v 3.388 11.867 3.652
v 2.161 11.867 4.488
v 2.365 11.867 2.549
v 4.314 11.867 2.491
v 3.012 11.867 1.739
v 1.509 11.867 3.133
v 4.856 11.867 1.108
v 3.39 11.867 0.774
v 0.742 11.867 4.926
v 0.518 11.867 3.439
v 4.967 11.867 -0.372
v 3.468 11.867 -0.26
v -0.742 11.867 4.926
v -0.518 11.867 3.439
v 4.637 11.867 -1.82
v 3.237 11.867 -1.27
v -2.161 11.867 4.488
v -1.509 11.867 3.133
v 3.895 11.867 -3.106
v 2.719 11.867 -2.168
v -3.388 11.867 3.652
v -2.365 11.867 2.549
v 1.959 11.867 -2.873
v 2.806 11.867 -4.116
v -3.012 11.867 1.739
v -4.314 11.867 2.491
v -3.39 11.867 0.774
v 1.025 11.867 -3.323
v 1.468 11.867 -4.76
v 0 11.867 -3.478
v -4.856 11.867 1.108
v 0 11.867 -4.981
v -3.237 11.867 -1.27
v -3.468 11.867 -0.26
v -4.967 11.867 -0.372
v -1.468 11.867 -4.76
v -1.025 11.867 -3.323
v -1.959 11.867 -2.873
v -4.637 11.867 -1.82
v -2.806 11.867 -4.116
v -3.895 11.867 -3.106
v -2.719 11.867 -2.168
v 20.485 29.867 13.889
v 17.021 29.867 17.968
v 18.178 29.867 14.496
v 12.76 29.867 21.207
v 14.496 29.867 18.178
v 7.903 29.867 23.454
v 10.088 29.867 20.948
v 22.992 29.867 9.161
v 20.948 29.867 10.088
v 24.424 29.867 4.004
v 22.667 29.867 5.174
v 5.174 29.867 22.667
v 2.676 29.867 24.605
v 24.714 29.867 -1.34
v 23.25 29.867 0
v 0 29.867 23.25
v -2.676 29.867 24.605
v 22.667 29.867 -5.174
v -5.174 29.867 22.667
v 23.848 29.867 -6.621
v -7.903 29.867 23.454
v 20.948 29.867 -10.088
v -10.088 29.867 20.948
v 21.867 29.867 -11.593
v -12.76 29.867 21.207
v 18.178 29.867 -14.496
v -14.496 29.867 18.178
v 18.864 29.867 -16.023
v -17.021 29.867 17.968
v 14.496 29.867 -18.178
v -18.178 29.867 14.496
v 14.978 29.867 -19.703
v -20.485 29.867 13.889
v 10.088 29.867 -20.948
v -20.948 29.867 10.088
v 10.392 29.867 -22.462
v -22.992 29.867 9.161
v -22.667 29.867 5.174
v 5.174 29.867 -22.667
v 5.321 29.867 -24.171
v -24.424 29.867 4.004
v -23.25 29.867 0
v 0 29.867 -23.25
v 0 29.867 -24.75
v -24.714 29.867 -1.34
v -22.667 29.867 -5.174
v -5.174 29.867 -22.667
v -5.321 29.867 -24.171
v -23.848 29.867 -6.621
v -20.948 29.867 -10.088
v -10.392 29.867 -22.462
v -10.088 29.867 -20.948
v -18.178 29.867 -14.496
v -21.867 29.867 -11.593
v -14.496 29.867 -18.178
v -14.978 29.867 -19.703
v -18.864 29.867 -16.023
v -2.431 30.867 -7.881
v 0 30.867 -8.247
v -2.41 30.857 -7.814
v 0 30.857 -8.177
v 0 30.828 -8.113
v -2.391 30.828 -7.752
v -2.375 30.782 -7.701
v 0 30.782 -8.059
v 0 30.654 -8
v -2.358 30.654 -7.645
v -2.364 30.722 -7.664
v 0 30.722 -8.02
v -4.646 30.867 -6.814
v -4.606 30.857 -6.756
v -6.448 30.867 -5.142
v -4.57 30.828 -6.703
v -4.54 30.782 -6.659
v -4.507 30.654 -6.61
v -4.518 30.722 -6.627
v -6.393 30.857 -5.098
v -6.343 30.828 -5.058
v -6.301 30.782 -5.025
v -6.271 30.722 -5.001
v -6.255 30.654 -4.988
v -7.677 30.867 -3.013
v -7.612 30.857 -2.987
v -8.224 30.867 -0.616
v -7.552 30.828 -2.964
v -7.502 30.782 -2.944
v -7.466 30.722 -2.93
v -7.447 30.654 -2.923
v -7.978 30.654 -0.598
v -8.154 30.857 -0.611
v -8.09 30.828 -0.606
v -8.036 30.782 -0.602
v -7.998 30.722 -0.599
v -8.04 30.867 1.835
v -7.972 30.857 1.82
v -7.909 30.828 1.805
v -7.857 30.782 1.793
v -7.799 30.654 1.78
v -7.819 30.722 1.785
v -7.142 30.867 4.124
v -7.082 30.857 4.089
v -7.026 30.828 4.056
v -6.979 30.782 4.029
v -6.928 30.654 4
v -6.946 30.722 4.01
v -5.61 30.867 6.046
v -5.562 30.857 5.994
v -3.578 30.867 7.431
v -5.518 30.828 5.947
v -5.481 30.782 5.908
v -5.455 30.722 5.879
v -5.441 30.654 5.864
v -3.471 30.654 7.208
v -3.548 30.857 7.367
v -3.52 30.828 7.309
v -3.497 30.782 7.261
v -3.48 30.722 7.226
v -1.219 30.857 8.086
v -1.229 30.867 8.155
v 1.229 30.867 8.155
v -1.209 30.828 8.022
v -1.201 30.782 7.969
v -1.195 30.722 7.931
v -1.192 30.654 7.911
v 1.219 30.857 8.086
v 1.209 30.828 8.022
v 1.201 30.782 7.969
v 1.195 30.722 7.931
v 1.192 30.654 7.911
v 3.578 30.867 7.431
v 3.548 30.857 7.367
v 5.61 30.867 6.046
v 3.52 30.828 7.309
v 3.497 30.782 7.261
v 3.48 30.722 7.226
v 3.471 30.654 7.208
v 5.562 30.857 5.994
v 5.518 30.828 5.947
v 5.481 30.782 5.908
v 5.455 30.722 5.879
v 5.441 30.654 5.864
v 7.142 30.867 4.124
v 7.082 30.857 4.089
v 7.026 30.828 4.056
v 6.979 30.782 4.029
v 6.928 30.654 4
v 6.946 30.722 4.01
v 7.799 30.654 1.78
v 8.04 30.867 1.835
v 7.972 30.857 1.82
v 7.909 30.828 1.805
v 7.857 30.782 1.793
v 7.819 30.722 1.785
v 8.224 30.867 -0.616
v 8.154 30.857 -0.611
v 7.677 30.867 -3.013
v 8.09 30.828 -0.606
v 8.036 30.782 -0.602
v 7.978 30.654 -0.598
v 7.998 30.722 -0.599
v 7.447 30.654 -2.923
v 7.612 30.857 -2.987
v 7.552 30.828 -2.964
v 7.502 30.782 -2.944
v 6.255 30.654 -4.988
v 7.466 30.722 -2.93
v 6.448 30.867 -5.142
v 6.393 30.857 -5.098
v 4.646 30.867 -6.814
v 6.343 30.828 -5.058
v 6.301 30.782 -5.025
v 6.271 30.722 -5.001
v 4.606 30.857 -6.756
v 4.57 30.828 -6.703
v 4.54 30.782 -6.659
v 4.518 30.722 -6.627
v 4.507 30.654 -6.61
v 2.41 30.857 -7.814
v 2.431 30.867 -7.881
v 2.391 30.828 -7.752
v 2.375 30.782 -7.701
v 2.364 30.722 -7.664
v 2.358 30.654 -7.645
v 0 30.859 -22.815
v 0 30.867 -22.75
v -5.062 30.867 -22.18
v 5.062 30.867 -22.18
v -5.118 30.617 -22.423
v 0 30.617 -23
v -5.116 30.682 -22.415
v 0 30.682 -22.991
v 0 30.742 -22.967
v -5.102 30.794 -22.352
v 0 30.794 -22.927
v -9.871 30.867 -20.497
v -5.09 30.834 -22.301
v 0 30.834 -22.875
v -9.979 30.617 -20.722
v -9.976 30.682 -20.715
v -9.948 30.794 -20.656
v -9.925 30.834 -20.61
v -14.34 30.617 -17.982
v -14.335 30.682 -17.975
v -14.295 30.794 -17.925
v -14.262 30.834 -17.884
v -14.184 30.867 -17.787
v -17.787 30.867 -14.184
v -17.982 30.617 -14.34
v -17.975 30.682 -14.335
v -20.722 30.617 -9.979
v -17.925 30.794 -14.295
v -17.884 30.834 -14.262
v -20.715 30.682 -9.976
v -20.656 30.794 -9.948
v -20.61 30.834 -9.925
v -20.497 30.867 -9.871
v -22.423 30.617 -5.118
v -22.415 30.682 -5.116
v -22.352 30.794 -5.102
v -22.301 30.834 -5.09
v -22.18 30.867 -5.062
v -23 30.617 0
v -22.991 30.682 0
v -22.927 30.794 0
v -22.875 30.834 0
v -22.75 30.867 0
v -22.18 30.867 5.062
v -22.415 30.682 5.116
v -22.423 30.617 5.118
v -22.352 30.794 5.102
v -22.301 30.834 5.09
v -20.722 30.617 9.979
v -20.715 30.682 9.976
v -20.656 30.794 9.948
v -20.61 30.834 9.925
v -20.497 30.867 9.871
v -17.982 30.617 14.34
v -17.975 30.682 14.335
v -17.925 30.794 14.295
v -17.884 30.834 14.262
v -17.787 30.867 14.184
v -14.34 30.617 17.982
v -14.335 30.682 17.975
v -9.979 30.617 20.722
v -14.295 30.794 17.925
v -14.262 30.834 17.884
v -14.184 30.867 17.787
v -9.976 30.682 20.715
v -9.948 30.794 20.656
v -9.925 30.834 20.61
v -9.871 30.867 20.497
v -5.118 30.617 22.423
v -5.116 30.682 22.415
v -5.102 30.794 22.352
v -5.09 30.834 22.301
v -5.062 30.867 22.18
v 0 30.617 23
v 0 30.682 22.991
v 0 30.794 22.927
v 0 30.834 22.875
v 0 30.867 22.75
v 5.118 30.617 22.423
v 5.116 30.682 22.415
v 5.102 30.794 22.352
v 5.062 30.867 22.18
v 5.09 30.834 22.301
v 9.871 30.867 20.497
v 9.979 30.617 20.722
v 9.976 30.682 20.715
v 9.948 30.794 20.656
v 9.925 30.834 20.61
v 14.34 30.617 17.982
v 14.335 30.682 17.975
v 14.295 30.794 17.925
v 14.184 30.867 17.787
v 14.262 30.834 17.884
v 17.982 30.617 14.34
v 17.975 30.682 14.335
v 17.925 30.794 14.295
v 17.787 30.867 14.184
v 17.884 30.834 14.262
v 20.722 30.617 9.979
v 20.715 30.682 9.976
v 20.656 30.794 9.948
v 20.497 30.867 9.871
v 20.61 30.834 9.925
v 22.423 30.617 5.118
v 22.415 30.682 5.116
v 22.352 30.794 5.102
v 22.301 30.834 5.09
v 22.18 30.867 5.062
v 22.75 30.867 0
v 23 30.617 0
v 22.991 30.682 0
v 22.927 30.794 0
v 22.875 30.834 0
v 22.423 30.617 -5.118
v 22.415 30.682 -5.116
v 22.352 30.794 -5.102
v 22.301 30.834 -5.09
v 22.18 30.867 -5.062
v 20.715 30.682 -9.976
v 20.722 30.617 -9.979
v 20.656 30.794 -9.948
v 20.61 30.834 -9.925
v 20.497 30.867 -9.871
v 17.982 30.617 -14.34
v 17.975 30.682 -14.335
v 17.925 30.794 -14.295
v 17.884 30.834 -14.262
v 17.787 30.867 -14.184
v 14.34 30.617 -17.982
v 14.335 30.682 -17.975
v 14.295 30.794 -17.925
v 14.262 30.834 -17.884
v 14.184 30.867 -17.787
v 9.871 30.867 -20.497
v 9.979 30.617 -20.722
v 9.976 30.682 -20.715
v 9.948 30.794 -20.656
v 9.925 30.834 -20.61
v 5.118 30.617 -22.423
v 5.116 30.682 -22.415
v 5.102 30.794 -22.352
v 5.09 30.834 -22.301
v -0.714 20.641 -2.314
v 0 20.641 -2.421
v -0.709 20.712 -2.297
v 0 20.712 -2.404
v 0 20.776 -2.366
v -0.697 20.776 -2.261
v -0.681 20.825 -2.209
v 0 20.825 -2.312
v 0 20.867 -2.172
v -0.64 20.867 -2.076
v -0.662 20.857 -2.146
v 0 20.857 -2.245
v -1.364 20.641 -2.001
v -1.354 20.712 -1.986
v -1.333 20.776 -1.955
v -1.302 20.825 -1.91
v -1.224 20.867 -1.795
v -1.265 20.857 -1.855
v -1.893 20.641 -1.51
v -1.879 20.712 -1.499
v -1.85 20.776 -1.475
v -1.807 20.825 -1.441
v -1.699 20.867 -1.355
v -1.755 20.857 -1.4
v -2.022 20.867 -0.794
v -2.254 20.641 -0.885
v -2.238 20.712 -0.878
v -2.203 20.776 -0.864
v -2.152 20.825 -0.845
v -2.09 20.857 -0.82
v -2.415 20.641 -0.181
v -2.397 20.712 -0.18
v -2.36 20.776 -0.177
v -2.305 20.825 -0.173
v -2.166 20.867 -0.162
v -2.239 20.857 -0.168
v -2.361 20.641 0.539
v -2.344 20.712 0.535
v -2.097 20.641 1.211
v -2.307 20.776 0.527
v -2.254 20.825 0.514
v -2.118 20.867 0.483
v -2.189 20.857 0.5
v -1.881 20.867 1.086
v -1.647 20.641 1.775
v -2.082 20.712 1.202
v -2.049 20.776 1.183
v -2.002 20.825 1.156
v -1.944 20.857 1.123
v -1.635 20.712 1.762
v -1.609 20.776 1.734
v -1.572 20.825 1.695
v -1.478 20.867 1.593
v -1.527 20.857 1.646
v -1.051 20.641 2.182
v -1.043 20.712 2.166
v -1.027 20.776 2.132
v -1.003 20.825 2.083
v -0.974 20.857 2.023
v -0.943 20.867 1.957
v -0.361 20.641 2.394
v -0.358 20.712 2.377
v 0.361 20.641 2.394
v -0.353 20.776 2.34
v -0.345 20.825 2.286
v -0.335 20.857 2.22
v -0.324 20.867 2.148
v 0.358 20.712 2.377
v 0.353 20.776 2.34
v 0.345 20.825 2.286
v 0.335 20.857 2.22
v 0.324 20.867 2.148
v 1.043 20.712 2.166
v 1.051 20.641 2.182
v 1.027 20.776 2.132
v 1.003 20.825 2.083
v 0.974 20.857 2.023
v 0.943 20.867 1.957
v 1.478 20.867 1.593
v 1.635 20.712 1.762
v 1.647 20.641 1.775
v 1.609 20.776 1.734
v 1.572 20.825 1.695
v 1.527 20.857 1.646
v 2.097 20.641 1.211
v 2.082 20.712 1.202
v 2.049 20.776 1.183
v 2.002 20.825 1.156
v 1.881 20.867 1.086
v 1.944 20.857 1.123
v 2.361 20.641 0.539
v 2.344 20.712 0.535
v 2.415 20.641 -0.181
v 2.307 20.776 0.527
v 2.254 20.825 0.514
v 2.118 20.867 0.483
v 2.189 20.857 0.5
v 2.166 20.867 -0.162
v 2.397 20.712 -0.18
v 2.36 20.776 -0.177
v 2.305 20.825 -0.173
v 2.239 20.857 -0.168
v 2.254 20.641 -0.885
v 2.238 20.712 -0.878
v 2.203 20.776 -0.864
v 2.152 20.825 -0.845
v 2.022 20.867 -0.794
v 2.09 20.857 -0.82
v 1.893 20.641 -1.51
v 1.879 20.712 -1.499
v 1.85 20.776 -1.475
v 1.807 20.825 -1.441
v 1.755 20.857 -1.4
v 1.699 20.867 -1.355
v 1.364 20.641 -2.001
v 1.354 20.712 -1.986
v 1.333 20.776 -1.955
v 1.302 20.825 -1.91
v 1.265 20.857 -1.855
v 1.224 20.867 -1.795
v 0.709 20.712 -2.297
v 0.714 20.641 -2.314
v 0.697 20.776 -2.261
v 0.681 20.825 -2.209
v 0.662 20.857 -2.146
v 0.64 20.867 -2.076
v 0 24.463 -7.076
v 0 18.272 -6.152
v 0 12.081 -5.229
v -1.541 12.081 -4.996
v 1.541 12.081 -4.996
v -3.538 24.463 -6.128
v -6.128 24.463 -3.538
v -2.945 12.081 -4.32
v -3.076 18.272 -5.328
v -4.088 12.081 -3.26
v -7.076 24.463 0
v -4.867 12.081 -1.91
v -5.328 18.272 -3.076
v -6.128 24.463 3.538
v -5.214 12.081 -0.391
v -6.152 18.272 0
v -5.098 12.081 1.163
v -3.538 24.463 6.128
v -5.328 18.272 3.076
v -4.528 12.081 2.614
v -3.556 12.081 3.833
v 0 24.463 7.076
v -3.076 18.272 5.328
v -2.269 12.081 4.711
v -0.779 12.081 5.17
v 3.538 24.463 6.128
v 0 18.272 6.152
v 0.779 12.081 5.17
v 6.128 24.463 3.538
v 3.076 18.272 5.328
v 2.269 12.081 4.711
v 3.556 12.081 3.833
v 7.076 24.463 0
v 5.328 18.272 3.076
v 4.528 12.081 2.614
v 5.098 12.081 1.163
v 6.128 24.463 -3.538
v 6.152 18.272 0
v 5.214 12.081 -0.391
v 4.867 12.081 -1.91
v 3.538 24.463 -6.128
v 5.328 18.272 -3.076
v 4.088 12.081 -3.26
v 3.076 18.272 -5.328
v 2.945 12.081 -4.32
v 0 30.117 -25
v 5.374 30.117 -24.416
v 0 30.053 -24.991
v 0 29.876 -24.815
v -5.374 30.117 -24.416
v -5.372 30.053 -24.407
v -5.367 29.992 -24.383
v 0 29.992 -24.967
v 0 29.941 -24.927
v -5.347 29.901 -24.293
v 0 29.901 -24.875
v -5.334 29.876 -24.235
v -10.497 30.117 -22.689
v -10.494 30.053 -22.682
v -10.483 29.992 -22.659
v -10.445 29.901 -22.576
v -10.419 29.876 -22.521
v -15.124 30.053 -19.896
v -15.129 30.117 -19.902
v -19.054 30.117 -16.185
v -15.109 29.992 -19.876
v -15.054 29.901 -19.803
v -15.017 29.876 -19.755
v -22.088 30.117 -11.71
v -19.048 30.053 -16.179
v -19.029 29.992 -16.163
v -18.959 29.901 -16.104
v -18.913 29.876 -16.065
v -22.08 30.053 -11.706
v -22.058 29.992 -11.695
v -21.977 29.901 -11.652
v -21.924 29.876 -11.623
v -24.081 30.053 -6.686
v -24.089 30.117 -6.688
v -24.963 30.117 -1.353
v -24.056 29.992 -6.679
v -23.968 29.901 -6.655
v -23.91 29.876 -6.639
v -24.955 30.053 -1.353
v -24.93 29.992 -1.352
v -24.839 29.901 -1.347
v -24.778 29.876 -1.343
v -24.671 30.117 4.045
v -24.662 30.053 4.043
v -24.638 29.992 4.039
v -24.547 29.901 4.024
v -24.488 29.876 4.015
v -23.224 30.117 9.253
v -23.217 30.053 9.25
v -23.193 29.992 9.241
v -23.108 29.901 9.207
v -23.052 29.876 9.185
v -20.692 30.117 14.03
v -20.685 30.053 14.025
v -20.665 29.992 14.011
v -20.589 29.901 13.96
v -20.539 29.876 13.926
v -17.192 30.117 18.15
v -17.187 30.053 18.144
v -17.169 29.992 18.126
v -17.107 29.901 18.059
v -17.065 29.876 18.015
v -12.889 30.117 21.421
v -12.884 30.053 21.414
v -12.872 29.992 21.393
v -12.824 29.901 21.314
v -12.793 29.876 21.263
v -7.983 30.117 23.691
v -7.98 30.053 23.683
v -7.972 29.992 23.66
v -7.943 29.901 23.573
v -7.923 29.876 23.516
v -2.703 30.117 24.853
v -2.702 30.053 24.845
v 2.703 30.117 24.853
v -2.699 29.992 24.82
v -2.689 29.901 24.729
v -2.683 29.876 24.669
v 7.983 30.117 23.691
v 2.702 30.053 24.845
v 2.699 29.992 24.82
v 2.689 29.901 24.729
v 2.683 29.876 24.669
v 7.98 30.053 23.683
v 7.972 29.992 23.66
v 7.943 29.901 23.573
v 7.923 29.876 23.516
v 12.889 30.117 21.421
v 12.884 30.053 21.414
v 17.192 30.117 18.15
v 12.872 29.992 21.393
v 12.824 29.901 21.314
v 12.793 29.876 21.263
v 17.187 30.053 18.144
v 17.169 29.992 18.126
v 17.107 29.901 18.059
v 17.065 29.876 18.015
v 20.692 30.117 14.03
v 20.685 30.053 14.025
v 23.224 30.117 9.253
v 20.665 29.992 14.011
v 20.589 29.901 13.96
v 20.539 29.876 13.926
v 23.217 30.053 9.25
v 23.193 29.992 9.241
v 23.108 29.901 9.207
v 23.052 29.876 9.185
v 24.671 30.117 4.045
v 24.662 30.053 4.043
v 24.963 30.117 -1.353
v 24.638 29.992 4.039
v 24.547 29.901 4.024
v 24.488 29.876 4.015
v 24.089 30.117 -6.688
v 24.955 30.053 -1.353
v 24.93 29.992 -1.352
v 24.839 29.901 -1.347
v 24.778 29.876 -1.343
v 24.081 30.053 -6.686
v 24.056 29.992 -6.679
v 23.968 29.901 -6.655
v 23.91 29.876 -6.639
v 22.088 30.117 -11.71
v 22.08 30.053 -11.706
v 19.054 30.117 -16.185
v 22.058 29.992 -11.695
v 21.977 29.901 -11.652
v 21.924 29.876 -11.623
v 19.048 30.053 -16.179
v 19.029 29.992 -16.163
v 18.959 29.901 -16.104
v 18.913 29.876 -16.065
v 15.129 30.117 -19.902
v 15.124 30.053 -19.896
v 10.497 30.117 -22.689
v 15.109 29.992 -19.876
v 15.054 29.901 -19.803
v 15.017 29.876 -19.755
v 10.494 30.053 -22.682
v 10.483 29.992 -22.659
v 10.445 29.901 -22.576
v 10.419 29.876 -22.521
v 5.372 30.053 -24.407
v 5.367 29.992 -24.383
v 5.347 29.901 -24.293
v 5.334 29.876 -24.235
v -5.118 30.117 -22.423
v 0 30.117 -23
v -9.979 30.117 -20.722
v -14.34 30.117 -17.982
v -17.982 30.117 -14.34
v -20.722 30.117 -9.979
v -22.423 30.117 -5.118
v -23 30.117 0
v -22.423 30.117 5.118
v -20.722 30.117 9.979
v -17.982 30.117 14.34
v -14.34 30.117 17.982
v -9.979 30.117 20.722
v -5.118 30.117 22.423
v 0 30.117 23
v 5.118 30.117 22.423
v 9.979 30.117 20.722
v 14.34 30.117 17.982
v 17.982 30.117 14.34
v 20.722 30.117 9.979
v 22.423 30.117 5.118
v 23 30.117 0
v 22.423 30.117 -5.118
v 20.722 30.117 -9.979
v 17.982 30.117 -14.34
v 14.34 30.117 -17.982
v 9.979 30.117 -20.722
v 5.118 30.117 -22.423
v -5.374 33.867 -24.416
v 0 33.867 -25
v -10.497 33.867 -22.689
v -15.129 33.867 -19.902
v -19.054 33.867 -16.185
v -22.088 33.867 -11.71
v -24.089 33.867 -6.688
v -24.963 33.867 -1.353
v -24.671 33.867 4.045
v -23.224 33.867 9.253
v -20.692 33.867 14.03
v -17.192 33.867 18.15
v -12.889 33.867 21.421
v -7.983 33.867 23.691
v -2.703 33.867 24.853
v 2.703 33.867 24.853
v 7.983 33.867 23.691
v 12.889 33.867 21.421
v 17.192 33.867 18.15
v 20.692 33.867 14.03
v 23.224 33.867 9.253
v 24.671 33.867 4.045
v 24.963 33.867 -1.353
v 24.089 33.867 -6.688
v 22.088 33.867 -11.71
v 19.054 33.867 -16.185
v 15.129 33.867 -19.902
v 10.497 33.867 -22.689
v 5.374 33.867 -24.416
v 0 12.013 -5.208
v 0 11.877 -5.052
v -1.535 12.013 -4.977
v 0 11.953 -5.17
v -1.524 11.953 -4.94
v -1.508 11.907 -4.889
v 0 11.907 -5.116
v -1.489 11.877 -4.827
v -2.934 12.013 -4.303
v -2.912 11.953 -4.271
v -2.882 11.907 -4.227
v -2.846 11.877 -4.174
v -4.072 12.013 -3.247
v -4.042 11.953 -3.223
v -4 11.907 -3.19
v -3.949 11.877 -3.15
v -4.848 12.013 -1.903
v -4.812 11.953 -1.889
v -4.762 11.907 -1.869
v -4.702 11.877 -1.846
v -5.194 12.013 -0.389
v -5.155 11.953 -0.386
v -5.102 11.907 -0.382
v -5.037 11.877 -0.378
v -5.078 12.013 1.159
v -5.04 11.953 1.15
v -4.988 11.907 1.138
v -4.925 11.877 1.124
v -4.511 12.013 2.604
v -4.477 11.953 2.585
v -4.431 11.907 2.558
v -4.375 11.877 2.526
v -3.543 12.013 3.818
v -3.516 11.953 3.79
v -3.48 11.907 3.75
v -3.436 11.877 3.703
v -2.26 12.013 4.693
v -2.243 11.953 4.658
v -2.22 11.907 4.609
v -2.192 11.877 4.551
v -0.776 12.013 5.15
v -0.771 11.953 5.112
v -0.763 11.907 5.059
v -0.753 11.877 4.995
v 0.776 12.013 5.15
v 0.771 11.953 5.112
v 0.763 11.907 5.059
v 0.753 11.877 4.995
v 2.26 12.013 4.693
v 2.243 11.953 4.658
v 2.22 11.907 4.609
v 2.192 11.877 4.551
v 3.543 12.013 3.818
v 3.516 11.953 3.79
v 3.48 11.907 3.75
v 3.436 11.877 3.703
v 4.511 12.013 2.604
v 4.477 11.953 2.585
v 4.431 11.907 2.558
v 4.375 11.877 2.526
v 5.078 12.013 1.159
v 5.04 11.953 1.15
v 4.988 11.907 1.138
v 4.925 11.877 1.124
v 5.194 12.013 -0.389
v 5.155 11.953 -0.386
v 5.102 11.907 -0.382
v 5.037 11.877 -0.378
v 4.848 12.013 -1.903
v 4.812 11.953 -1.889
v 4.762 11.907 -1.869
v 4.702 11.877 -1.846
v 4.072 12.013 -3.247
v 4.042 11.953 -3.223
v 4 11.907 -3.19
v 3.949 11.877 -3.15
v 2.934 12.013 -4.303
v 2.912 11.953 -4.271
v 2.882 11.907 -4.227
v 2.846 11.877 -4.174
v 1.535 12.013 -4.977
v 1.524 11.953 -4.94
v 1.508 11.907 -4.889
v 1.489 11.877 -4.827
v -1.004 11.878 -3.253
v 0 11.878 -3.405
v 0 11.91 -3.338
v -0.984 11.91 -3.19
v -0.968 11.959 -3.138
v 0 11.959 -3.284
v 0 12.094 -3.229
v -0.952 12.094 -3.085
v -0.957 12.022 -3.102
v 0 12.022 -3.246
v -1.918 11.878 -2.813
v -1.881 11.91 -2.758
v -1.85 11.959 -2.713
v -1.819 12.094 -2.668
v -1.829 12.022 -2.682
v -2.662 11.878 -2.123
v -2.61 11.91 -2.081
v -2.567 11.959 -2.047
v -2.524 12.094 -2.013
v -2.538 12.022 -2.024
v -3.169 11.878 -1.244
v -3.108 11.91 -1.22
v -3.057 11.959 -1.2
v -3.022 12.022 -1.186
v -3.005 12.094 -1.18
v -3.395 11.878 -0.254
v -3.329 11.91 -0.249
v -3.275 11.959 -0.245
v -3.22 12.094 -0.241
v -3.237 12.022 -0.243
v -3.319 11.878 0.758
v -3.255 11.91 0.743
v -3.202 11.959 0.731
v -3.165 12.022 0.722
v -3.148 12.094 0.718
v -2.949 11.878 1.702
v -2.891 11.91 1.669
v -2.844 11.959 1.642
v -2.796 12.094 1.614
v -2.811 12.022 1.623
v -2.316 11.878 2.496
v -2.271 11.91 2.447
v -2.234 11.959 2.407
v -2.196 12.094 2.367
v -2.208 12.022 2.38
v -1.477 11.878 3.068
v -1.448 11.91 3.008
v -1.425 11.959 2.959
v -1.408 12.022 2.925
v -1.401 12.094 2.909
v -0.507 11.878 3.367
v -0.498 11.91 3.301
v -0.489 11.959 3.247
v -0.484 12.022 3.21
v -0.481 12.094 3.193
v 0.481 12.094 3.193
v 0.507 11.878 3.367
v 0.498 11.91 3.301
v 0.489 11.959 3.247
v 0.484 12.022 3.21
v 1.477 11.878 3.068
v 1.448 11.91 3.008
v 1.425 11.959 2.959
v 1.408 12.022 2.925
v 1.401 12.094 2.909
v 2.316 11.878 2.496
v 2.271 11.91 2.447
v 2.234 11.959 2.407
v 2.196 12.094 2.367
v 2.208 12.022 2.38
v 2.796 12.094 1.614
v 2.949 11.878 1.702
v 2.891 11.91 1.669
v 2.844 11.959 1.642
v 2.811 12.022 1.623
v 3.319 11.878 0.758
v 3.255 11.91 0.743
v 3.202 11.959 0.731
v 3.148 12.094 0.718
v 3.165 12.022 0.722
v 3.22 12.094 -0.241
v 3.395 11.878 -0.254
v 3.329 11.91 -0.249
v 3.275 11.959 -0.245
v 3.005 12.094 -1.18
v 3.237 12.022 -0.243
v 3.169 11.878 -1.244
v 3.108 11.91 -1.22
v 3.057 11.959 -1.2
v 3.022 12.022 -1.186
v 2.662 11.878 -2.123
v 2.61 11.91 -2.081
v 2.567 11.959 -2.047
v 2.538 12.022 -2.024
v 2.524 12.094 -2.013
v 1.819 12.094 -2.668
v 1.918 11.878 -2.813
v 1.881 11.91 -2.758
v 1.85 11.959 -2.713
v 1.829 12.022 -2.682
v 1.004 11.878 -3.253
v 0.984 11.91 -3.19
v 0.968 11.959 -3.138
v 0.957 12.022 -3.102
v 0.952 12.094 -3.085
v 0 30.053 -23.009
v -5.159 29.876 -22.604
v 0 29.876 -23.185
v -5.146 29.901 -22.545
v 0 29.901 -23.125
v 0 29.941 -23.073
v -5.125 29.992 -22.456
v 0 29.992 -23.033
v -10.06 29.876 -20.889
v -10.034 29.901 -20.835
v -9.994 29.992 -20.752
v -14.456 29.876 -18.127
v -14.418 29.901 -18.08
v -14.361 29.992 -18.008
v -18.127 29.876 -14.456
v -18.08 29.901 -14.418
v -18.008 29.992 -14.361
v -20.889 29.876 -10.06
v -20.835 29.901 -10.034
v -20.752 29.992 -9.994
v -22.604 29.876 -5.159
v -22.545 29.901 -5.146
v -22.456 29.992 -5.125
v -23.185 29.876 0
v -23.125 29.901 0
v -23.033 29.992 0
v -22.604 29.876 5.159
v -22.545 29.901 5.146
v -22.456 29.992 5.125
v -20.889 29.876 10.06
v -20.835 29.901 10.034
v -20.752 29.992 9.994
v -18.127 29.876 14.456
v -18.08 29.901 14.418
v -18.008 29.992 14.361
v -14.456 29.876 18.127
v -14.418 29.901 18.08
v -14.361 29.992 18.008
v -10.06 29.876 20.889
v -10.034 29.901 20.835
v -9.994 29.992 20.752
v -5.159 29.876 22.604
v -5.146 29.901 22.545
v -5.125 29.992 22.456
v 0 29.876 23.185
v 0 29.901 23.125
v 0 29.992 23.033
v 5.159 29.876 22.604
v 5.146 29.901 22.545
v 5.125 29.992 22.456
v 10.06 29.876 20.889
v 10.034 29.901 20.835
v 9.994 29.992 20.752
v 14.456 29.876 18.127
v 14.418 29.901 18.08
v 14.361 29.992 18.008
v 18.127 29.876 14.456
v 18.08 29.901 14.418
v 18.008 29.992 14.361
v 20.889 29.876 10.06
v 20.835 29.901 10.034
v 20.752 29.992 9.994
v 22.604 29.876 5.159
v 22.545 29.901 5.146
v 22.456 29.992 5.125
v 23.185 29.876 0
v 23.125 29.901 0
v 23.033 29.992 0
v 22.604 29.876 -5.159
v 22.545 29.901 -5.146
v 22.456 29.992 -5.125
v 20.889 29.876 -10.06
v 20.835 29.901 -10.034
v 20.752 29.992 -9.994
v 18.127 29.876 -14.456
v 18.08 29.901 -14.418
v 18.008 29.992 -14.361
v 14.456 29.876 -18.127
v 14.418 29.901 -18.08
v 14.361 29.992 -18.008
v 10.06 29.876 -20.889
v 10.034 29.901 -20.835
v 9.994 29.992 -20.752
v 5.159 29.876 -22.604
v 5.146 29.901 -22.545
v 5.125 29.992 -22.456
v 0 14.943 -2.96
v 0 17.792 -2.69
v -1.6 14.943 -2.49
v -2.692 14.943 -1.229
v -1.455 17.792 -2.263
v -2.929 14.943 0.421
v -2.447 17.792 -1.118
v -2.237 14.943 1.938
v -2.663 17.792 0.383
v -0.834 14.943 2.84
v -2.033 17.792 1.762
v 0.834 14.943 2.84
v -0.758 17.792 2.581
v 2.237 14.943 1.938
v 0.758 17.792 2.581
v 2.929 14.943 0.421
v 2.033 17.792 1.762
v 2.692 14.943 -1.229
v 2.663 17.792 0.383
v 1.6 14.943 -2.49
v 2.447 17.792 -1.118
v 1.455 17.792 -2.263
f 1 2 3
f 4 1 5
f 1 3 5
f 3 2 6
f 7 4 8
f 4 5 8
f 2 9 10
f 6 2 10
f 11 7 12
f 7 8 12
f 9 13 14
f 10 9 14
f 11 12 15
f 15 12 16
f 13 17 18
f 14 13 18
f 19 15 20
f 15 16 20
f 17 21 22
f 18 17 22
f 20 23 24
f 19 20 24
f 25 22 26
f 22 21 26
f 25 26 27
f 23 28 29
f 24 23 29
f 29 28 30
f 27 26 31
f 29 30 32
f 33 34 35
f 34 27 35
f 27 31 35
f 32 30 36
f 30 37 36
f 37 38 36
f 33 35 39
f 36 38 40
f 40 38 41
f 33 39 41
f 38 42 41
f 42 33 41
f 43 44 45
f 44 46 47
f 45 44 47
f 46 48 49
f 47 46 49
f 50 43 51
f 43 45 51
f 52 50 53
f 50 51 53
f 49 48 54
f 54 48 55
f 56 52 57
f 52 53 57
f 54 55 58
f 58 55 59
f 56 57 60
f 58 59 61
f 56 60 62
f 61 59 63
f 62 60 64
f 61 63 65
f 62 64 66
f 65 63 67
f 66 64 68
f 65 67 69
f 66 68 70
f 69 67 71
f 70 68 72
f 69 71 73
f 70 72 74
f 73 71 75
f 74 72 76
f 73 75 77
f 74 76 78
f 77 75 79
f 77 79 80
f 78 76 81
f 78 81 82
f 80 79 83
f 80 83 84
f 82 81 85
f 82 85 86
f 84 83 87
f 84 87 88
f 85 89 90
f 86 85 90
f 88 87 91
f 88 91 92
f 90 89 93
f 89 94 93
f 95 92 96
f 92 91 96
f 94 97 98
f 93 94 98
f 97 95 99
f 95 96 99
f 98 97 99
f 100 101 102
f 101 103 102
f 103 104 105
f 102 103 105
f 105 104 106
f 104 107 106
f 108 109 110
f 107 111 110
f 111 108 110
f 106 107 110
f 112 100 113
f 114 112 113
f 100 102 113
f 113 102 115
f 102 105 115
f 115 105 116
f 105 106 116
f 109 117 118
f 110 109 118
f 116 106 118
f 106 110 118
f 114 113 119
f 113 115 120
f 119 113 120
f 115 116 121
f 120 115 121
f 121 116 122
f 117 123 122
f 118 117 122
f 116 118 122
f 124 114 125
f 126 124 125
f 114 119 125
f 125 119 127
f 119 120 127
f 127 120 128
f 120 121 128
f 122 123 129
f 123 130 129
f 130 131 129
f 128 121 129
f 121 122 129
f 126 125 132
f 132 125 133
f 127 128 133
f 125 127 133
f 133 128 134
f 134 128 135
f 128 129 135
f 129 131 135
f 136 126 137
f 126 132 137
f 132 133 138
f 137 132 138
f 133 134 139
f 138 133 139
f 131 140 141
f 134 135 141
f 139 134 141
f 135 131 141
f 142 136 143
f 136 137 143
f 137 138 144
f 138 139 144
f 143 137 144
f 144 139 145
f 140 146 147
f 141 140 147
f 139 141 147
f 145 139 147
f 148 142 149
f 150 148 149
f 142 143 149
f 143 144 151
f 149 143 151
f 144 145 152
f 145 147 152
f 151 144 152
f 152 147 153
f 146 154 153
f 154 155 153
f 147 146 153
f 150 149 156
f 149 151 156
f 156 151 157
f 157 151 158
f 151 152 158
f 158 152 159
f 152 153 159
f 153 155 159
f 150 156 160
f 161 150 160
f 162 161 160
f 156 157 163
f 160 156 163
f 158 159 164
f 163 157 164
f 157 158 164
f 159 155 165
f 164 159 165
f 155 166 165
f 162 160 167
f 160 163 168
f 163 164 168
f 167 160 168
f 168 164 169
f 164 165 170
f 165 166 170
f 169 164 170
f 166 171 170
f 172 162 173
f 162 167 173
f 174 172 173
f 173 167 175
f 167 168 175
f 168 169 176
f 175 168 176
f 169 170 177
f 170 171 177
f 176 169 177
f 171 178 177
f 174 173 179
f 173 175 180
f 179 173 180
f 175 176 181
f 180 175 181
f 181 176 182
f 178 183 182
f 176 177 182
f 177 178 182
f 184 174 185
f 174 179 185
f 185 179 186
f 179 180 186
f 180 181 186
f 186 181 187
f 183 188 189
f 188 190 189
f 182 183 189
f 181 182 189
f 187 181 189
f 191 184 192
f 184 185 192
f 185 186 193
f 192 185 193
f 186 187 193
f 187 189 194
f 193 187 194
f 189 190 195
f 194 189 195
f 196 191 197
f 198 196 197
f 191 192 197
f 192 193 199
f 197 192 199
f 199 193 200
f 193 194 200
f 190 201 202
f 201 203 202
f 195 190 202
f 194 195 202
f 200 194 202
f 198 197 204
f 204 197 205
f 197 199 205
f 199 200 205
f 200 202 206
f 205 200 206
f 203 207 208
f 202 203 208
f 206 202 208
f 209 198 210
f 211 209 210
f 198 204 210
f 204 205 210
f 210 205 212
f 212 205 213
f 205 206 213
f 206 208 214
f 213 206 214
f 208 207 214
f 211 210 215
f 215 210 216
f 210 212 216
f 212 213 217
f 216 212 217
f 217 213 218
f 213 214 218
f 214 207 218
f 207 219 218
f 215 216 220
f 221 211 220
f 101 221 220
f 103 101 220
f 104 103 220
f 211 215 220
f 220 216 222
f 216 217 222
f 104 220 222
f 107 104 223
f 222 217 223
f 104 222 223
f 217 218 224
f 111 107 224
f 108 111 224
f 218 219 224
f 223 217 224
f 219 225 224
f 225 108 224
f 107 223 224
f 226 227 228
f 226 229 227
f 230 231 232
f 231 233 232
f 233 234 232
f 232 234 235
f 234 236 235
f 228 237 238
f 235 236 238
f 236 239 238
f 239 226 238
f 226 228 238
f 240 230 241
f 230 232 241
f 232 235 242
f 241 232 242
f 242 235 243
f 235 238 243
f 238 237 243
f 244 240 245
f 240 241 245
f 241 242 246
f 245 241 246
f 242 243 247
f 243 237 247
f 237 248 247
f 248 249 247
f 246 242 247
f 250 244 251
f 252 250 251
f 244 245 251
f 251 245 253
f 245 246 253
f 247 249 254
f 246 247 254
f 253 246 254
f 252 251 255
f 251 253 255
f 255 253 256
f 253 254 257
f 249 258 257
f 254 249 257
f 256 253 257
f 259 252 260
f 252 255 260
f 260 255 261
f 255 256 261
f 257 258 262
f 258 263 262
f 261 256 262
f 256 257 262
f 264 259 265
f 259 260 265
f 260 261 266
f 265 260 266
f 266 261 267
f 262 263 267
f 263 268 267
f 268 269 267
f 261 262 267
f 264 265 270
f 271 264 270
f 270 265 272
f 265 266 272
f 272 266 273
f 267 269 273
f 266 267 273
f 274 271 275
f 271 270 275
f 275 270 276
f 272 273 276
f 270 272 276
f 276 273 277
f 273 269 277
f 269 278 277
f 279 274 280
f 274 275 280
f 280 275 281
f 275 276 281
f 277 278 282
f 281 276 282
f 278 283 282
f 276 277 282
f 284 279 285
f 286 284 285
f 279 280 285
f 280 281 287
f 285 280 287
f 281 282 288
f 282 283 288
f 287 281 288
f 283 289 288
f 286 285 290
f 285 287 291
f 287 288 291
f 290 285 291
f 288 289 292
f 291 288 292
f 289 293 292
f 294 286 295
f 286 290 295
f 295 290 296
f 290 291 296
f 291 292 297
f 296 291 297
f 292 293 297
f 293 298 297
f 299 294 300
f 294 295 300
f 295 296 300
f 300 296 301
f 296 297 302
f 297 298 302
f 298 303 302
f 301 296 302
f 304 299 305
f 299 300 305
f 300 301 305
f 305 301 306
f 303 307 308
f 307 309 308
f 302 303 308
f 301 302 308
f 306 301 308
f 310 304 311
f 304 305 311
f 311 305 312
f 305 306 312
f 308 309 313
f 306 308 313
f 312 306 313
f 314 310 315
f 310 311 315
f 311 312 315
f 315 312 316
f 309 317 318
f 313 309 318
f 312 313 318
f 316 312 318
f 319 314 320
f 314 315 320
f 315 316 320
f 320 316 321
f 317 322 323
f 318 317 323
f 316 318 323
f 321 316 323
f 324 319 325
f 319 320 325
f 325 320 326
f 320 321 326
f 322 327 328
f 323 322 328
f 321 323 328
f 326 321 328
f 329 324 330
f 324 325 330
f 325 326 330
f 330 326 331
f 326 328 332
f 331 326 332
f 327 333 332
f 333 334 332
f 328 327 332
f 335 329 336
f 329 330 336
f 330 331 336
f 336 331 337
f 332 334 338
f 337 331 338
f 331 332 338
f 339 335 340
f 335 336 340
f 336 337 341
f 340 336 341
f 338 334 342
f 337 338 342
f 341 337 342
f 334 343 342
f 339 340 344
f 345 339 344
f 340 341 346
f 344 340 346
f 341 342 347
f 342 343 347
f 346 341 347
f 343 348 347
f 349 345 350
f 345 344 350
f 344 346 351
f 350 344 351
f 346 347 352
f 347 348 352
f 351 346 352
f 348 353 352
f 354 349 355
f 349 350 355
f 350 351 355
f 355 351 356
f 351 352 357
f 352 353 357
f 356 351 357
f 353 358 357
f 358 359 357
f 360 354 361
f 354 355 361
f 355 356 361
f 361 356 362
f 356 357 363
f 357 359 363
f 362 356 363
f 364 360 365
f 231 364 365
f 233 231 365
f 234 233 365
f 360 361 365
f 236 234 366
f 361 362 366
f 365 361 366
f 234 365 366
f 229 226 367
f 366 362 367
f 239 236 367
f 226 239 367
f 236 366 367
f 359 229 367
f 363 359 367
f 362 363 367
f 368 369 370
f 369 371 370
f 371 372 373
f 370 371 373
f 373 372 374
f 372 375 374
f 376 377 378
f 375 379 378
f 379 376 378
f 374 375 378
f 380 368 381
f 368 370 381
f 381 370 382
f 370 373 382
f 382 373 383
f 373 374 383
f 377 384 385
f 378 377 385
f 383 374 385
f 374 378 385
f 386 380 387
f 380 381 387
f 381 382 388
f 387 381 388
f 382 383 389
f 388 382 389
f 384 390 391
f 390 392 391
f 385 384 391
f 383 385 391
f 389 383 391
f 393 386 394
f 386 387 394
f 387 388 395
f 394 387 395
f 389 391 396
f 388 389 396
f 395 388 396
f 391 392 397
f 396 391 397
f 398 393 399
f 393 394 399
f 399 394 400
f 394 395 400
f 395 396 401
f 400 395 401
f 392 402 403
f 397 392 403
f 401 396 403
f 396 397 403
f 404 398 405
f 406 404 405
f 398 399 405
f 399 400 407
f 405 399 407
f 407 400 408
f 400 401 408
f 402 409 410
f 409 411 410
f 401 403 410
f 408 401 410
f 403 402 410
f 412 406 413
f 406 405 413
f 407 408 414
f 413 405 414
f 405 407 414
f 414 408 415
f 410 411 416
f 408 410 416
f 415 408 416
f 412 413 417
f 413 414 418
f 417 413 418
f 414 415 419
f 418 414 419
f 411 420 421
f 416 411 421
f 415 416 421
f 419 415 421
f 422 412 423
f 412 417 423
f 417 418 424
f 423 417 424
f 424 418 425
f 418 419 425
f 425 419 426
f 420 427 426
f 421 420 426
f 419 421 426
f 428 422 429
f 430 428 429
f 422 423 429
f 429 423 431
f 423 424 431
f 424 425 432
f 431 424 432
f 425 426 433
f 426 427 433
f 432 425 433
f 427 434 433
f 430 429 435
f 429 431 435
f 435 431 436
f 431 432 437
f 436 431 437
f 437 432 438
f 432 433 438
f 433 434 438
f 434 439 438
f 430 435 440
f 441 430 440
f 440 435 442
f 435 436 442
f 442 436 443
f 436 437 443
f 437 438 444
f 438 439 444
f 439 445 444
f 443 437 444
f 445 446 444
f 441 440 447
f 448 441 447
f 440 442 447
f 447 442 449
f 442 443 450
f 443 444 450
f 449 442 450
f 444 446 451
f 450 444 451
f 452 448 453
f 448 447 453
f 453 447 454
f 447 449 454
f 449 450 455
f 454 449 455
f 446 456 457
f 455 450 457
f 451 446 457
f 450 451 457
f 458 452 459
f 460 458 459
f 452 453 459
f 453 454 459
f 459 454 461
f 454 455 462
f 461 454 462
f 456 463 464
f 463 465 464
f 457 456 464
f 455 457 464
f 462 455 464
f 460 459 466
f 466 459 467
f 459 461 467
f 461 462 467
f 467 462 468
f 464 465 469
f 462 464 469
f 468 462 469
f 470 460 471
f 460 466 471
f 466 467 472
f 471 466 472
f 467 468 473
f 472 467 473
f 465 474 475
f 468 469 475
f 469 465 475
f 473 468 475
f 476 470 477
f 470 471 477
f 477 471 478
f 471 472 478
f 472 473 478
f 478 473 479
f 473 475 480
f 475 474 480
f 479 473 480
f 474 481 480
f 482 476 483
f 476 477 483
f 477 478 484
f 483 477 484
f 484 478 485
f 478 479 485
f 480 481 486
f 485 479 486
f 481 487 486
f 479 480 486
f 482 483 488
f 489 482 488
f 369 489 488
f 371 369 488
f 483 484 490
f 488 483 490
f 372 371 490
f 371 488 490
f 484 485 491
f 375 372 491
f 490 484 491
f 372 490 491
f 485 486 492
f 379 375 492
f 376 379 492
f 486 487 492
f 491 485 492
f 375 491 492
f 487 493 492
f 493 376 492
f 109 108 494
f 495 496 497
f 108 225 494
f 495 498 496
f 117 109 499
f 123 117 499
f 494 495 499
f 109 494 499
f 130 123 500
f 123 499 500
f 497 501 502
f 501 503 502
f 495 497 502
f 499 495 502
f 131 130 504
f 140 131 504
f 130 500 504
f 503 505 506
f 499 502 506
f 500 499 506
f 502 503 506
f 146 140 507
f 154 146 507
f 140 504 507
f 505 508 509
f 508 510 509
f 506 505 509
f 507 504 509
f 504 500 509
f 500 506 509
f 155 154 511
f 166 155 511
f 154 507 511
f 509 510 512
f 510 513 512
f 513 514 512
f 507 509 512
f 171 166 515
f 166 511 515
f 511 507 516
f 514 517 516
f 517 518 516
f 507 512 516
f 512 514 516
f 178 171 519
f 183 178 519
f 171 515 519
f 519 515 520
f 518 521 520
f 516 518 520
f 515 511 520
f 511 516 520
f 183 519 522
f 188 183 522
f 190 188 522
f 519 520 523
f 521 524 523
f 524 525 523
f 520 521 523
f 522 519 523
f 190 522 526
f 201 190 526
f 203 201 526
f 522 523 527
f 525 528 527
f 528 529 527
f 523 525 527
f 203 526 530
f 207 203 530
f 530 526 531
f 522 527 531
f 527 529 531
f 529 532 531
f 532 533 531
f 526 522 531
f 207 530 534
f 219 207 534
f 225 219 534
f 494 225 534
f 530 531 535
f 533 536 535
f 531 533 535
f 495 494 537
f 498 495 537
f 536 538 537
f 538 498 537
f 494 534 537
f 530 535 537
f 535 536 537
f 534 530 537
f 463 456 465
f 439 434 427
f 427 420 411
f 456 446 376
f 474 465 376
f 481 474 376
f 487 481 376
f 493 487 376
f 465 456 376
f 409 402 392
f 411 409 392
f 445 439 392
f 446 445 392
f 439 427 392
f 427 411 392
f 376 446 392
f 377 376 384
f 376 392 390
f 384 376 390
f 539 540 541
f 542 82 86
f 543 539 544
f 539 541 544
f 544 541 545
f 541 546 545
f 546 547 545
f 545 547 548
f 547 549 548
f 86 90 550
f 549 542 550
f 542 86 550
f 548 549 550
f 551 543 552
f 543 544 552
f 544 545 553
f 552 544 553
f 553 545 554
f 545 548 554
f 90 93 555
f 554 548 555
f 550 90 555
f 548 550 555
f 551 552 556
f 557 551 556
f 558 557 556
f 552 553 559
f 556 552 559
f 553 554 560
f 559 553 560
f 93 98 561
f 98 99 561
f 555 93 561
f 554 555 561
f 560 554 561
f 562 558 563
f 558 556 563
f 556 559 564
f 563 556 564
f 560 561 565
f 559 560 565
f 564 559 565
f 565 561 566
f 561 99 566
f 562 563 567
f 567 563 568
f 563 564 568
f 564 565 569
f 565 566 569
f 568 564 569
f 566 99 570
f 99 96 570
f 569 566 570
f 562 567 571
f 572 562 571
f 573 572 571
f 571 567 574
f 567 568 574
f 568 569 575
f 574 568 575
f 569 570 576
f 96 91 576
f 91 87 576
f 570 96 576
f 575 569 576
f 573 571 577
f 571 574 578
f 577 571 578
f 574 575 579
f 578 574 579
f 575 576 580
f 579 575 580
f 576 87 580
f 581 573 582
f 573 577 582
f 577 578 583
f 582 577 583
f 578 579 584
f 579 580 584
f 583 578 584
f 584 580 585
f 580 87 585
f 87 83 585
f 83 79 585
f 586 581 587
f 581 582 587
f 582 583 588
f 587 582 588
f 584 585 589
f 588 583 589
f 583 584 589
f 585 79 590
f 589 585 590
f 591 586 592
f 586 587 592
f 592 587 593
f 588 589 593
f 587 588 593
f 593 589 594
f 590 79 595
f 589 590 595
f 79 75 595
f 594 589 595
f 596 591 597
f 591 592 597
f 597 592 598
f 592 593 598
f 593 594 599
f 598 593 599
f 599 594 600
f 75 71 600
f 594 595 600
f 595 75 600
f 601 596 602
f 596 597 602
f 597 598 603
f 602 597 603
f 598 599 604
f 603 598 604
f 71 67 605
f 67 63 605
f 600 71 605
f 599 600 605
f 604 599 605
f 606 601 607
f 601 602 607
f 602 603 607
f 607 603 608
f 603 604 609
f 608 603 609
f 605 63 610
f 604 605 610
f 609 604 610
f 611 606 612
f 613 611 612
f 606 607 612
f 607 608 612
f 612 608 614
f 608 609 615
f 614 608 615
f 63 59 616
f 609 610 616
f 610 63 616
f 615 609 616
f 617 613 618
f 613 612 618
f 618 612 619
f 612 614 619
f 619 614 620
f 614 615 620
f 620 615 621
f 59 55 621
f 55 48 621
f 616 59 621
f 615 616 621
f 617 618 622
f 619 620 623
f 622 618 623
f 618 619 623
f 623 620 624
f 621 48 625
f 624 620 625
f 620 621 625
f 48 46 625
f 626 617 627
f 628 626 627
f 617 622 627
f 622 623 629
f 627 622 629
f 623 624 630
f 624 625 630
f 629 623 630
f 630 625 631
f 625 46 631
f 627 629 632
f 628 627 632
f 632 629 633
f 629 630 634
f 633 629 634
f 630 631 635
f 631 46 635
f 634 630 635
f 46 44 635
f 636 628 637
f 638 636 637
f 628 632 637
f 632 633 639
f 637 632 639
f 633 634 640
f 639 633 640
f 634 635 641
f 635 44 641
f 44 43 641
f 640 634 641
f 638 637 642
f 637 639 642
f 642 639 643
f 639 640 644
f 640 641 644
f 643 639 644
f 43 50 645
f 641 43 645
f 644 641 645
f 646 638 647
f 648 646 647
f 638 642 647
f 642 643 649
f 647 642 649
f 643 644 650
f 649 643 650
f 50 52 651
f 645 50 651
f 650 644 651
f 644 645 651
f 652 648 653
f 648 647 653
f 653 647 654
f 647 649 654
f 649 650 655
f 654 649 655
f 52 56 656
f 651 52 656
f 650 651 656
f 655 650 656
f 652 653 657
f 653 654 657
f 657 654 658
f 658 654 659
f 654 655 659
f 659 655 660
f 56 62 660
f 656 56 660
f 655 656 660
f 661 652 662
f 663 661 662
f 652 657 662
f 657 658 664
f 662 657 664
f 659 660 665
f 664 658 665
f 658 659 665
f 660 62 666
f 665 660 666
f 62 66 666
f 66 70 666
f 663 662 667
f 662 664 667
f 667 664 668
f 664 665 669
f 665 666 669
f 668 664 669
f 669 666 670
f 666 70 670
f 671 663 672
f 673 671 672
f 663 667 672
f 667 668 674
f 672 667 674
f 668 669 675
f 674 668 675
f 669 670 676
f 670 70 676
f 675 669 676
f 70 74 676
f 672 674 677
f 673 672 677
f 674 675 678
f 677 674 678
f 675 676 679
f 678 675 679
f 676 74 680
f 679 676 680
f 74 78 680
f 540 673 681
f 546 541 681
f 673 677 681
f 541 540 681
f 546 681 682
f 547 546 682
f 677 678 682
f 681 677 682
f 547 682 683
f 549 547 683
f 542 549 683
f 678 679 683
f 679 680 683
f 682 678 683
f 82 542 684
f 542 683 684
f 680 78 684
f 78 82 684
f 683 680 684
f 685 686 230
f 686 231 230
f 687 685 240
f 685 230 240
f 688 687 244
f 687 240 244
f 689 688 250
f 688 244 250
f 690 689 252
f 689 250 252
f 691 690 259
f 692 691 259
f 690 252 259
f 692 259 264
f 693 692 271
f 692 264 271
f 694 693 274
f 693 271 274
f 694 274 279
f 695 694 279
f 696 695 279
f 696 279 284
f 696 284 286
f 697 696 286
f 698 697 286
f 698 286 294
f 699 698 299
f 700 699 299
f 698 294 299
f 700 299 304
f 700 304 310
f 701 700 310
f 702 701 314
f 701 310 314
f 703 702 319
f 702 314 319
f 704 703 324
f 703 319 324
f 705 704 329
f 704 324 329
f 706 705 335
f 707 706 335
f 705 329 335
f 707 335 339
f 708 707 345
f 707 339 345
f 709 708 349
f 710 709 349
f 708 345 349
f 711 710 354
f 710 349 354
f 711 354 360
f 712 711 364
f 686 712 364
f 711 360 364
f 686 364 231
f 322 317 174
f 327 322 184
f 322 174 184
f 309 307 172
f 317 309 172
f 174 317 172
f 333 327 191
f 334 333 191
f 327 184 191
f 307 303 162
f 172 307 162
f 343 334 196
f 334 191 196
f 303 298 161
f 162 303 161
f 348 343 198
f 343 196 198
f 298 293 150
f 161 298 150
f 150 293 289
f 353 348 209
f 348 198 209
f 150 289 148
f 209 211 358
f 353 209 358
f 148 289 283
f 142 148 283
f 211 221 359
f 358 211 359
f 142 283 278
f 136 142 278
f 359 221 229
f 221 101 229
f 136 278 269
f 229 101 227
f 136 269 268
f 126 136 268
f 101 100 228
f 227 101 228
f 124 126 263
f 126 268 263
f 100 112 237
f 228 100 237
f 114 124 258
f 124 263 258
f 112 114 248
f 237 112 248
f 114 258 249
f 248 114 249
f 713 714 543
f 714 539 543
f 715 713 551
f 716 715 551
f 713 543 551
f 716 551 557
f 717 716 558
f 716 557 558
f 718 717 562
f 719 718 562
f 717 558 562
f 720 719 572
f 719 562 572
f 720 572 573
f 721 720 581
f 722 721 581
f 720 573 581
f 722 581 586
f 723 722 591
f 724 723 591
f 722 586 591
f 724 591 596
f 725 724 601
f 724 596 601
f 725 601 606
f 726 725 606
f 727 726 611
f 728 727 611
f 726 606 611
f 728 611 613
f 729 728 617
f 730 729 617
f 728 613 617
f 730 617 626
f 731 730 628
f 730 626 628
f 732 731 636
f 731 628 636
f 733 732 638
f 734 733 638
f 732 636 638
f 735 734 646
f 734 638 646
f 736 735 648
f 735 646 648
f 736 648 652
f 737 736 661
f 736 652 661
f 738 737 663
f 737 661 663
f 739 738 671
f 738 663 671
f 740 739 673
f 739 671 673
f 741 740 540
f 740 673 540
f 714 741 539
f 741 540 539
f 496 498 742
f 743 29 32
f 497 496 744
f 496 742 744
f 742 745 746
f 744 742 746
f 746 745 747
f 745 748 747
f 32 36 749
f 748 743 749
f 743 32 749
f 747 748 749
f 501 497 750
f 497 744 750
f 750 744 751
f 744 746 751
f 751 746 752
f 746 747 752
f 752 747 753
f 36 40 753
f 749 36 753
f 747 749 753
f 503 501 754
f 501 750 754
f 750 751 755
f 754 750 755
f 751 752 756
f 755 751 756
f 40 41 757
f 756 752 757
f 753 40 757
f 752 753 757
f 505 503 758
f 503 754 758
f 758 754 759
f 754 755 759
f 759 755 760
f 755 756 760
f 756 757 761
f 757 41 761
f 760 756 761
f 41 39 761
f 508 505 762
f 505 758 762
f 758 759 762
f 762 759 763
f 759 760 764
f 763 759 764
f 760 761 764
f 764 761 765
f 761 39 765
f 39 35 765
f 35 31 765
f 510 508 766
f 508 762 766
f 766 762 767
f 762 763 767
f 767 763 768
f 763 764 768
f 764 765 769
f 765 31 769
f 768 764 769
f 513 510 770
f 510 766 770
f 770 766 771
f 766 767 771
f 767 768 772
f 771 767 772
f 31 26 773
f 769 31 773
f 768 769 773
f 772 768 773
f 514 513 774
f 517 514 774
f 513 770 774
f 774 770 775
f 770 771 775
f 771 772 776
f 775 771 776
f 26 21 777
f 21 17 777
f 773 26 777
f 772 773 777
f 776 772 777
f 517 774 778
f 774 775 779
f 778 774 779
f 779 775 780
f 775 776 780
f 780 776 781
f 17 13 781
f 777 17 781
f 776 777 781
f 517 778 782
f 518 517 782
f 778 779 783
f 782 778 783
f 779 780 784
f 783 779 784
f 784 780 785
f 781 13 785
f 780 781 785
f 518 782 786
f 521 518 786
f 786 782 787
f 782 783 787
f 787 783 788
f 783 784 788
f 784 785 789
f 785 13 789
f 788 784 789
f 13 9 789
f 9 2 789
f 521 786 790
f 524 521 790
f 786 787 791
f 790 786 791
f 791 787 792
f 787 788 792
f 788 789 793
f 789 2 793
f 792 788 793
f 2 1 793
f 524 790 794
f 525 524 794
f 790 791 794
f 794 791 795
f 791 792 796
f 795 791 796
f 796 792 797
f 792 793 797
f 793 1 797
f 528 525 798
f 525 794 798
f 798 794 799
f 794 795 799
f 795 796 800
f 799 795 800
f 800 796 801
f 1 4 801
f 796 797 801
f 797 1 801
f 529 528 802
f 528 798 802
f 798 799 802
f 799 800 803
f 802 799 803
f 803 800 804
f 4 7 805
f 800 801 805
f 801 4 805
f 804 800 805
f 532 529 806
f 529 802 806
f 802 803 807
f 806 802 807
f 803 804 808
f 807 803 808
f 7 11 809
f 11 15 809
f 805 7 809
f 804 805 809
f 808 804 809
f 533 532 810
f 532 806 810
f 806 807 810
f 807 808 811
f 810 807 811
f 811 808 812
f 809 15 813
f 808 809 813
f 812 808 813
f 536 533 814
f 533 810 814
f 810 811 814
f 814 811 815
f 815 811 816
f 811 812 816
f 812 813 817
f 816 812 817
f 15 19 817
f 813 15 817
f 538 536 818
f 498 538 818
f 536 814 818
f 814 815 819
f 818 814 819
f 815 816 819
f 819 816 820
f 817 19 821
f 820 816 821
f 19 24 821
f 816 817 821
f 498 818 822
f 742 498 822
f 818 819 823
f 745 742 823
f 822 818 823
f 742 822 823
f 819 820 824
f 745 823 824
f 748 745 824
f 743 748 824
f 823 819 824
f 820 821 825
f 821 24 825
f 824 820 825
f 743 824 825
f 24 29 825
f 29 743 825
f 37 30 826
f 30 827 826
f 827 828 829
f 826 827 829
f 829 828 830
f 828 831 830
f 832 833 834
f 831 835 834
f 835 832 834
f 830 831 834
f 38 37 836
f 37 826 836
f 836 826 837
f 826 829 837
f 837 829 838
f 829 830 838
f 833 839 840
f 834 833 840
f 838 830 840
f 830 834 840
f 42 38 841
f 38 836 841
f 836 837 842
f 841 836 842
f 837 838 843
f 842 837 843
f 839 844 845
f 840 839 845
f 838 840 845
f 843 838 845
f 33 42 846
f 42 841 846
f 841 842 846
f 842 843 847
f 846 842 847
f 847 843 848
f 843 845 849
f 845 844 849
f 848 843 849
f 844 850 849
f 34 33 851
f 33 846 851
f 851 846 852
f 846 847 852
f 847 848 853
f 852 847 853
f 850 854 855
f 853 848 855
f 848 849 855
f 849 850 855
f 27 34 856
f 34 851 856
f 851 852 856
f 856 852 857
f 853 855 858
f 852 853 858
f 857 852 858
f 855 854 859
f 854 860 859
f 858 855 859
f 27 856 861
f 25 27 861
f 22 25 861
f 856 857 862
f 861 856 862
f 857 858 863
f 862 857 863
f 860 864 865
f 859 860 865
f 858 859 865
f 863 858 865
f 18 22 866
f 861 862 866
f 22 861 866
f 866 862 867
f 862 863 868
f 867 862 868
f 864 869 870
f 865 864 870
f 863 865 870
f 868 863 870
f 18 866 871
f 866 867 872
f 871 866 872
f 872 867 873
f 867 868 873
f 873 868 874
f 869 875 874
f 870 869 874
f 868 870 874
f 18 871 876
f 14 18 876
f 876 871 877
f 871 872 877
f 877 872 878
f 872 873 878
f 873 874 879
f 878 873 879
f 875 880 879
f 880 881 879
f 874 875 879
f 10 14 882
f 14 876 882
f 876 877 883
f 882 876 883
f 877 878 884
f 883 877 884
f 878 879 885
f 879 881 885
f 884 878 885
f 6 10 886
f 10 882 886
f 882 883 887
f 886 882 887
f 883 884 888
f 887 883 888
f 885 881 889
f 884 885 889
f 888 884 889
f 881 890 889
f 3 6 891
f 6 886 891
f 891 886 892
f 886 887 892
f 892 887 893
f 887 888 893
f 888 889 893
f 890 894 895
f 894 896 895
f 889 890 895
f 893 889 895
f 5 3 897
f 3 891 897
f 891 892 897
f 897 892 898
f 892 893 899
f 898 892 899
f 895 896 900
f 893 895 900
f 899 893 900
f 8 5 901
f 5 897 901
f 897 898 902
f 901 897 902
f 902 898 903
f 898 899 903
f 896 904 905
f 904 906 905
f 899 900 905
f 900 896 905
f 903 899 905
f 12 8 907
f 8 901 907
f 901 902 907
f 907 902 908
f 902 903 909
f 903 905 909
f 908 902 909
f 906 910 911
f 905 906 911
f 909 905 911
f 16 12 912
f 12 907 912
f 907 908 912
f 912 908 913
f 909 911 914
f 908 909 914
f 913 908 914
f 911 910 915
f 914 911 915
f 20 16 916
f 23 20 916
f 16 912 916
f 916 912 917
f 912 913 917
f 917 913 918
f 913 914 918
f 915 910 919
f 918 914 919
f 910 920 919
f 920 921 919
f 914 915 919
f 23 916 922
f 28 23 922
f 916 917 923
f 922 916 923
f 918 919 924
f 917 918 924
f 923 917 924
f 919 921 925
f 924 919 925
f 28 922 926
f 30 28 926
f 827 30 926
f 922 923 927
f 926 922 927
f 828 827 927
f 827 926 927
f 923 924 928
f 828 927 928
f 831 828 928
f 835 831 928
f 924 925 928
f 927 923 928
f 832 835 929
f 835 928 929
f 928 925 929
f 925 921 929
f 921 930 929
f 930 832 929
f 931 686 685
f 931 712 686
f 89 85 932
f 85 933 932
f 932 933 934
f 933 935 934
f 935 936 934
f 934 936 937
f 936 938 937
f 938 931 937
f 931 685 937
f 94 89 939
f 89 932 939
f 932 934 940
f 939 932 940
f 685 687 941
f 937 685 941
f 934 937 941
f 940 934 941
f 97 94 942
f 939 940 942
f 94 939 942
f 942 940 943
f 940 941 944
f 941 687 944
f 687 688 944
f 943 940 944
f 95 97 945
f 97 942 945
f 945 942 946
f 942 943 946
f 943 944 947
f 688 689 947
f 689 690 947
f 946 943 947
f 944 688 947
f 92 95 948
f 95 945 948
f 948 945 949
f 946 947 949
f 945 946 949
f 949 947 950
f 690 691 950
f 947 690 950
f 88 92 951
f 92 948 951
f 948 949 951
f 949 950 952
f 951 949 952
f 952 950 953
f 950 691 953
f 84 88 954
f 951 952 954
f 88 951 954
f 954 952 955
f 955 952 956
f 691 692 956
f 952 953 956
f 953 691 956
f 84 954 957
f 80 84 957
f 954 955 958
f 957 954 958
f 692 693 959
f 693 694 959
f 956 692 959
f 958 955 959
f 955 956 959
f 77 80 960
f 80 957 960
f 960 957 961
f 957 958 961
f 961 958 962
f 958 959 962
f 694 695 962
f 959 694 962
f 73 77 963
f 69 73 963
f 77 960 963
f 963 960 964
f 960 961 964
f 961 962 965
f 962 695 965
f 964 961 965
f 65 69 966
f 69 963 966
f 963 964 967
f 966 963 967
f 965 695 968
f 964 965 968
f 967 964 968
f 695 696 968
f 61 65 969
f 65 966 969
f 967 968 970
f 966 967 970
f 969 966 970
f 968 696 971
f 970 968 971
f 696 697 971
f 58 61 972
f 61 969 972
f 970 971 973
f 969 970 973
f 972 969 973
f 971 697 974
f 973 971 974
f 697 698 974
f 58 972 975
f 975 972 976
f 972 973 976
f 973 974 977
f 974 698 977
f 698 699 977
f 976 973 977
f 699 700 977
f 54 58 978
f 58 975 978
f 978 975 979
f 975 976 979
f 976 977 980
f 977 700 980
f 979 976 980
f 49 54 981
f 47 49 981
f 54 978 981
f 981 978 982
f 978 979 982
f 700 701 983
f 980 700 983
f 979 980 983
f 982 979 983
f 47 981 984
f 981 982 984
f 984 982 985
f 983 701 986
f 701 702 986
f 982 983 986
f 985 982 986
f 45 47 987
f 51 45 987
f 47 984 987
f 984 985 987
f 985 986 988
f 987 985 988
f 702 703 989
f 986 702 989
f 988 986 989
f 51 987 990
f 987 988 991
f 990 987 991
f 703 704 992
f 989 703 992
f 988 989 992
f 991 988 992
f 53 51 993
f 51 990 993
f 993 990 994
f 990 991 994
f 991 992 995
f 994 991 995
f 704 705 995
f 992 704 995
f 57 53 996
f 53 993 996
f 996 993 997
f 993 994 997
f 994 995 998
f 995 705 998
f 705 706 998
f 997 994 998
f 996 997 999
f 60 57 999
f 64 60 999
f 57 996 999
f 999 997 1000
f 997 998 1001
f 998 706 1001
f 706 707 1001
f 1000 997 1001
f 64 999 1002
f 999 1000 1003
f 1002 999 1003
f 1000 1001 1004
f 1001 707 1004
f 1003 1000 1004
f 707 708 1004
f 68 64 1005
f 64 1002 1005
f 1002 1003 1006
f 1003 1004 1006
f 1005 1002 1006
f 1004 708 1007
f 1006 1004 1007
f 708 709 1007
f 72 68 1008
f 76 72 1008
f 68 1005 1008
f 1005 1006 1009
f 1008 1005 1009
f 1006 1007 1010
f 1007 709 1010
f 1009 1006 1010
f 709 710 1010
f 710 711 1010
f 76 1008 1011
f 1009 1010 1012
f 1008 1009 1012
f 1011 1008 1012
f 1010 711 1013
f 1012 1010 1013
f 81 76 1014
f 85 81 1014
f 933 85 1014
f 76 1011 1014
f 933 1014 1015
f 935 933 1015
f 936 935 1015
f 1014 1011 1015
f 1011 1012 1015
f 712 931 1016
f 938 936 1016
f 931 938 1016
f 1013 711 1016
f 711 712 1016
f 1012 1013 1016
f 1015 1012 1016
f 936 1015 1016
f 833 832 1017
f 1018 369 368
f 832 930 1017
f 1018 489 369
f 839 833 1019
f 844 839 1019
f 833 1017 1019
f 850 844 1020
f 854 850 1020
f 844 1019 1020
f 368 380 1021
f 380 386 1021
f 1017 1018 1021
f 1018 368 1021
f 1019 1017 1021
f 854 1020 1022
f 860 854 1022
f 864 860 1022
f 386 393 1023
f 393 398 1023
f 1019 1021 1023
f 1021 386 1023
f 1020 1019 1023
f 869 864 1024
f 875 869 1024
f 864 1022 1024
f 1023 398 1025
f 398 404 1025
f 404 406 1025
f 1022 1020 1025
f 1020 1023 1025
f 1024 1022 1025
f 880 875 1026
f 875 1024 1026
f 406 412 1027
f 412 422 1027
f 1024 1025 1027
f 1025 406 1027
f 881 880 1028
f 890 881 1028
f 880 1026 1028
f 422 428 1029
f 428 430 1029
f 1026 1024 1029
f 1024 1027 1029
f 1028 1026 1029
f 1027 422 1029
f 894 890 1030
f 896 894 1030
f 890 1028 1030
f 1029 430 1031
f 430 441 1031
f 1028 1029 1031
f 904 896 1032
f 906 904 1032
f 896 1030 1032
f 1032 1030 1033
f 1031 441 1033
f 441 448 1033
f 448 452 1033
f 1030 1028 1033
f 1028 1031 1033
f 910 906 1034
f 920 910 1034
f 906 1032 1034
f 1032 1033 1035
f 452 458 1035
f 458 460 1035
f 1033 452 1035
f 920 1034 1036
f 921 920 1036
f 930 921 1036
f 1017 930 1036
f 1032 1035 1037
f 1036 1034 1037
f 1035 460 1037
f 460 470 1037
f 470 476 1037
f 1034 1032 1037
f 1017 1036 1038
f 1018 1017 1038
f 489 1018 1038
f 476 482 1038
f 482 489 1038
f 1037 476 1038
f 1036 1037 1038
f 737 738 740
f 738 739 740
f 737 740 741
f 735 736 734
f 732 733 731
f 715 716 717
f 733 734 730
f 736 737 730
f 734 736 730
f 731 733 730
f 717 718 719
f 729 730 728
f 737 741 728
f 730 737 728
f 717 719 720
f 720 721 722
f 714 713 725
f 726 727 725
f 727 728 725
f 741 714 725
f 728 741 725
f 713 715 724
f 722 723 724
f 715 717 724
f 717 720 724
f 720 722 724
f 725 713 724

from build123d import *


with BuildPart() as part:
    # Sketch2 → Revolve1 (revolve)
    with BuildSketch(Plane.XY, mode=Mode.PRIVATE) as revolve1_sk:
        with BuildLine():
            Line((3.228608948, 12.093901983), (2.421391052, 20.640914998))
            ThreePointArc((2.421391052, 20.640914998), (2.340759387, 20.802309311), (2.172498617, 20.86740849))
            Line((2.172498617, 20.86740849), (0, 20.86740849))
            Line((0, 20.86740849), (0, 33.86740849))
            Line((0, 33.86740849), (25, 33.86740849))
            Line((25, 33.86740849), (25, 30.11740849))
            ThreePointArc((25, 30.11740849), (24.926776695, 29.940631795), (24.75, 29.86740849))
            Line((24.75, 29.86740849), (23.25, 29.86740849))
            ThreePointArc((23.25, 29.86740849), (23.073223305, 29.940631795), (23, 30.11740849))
            Line((23, 30.11740849), (23, 30.61740849))
            ThreePointArc((23, 30.61740849), (22.926776695, 30.794185186), (22.75, 30.86740849))
            Line((22.75, 30.86740849), (8.247262678, 30.86740849))
            ThreePointArc((8.247262678, 30.86740849), (8.084050398, 30.806780483), (8, 30.654302503))
            Line((8, 30.654302503), (5.228608948, 12.080514478))
            ThreePointArc((5.228608948, 12.080514478), (5.14455855, 11.928036498), (4.98134627, 11.86740849))
            Line((4.98134627, 11.86740849), (3.477501383, 11.86740849))
            ThreePointArc((3.477501383, 11.86740849), (3.309240613, 11.93250767), (3.228608948, 12.093901983))
        make_face()
    revolve(revolve1_sk.sketch.rotate(Axis((0, 20.86740849, 0), (0, 1, 0)), 90), axis=Axis((0, 20.86740849, 0), (0, 1, 0)))


solid = part.part
